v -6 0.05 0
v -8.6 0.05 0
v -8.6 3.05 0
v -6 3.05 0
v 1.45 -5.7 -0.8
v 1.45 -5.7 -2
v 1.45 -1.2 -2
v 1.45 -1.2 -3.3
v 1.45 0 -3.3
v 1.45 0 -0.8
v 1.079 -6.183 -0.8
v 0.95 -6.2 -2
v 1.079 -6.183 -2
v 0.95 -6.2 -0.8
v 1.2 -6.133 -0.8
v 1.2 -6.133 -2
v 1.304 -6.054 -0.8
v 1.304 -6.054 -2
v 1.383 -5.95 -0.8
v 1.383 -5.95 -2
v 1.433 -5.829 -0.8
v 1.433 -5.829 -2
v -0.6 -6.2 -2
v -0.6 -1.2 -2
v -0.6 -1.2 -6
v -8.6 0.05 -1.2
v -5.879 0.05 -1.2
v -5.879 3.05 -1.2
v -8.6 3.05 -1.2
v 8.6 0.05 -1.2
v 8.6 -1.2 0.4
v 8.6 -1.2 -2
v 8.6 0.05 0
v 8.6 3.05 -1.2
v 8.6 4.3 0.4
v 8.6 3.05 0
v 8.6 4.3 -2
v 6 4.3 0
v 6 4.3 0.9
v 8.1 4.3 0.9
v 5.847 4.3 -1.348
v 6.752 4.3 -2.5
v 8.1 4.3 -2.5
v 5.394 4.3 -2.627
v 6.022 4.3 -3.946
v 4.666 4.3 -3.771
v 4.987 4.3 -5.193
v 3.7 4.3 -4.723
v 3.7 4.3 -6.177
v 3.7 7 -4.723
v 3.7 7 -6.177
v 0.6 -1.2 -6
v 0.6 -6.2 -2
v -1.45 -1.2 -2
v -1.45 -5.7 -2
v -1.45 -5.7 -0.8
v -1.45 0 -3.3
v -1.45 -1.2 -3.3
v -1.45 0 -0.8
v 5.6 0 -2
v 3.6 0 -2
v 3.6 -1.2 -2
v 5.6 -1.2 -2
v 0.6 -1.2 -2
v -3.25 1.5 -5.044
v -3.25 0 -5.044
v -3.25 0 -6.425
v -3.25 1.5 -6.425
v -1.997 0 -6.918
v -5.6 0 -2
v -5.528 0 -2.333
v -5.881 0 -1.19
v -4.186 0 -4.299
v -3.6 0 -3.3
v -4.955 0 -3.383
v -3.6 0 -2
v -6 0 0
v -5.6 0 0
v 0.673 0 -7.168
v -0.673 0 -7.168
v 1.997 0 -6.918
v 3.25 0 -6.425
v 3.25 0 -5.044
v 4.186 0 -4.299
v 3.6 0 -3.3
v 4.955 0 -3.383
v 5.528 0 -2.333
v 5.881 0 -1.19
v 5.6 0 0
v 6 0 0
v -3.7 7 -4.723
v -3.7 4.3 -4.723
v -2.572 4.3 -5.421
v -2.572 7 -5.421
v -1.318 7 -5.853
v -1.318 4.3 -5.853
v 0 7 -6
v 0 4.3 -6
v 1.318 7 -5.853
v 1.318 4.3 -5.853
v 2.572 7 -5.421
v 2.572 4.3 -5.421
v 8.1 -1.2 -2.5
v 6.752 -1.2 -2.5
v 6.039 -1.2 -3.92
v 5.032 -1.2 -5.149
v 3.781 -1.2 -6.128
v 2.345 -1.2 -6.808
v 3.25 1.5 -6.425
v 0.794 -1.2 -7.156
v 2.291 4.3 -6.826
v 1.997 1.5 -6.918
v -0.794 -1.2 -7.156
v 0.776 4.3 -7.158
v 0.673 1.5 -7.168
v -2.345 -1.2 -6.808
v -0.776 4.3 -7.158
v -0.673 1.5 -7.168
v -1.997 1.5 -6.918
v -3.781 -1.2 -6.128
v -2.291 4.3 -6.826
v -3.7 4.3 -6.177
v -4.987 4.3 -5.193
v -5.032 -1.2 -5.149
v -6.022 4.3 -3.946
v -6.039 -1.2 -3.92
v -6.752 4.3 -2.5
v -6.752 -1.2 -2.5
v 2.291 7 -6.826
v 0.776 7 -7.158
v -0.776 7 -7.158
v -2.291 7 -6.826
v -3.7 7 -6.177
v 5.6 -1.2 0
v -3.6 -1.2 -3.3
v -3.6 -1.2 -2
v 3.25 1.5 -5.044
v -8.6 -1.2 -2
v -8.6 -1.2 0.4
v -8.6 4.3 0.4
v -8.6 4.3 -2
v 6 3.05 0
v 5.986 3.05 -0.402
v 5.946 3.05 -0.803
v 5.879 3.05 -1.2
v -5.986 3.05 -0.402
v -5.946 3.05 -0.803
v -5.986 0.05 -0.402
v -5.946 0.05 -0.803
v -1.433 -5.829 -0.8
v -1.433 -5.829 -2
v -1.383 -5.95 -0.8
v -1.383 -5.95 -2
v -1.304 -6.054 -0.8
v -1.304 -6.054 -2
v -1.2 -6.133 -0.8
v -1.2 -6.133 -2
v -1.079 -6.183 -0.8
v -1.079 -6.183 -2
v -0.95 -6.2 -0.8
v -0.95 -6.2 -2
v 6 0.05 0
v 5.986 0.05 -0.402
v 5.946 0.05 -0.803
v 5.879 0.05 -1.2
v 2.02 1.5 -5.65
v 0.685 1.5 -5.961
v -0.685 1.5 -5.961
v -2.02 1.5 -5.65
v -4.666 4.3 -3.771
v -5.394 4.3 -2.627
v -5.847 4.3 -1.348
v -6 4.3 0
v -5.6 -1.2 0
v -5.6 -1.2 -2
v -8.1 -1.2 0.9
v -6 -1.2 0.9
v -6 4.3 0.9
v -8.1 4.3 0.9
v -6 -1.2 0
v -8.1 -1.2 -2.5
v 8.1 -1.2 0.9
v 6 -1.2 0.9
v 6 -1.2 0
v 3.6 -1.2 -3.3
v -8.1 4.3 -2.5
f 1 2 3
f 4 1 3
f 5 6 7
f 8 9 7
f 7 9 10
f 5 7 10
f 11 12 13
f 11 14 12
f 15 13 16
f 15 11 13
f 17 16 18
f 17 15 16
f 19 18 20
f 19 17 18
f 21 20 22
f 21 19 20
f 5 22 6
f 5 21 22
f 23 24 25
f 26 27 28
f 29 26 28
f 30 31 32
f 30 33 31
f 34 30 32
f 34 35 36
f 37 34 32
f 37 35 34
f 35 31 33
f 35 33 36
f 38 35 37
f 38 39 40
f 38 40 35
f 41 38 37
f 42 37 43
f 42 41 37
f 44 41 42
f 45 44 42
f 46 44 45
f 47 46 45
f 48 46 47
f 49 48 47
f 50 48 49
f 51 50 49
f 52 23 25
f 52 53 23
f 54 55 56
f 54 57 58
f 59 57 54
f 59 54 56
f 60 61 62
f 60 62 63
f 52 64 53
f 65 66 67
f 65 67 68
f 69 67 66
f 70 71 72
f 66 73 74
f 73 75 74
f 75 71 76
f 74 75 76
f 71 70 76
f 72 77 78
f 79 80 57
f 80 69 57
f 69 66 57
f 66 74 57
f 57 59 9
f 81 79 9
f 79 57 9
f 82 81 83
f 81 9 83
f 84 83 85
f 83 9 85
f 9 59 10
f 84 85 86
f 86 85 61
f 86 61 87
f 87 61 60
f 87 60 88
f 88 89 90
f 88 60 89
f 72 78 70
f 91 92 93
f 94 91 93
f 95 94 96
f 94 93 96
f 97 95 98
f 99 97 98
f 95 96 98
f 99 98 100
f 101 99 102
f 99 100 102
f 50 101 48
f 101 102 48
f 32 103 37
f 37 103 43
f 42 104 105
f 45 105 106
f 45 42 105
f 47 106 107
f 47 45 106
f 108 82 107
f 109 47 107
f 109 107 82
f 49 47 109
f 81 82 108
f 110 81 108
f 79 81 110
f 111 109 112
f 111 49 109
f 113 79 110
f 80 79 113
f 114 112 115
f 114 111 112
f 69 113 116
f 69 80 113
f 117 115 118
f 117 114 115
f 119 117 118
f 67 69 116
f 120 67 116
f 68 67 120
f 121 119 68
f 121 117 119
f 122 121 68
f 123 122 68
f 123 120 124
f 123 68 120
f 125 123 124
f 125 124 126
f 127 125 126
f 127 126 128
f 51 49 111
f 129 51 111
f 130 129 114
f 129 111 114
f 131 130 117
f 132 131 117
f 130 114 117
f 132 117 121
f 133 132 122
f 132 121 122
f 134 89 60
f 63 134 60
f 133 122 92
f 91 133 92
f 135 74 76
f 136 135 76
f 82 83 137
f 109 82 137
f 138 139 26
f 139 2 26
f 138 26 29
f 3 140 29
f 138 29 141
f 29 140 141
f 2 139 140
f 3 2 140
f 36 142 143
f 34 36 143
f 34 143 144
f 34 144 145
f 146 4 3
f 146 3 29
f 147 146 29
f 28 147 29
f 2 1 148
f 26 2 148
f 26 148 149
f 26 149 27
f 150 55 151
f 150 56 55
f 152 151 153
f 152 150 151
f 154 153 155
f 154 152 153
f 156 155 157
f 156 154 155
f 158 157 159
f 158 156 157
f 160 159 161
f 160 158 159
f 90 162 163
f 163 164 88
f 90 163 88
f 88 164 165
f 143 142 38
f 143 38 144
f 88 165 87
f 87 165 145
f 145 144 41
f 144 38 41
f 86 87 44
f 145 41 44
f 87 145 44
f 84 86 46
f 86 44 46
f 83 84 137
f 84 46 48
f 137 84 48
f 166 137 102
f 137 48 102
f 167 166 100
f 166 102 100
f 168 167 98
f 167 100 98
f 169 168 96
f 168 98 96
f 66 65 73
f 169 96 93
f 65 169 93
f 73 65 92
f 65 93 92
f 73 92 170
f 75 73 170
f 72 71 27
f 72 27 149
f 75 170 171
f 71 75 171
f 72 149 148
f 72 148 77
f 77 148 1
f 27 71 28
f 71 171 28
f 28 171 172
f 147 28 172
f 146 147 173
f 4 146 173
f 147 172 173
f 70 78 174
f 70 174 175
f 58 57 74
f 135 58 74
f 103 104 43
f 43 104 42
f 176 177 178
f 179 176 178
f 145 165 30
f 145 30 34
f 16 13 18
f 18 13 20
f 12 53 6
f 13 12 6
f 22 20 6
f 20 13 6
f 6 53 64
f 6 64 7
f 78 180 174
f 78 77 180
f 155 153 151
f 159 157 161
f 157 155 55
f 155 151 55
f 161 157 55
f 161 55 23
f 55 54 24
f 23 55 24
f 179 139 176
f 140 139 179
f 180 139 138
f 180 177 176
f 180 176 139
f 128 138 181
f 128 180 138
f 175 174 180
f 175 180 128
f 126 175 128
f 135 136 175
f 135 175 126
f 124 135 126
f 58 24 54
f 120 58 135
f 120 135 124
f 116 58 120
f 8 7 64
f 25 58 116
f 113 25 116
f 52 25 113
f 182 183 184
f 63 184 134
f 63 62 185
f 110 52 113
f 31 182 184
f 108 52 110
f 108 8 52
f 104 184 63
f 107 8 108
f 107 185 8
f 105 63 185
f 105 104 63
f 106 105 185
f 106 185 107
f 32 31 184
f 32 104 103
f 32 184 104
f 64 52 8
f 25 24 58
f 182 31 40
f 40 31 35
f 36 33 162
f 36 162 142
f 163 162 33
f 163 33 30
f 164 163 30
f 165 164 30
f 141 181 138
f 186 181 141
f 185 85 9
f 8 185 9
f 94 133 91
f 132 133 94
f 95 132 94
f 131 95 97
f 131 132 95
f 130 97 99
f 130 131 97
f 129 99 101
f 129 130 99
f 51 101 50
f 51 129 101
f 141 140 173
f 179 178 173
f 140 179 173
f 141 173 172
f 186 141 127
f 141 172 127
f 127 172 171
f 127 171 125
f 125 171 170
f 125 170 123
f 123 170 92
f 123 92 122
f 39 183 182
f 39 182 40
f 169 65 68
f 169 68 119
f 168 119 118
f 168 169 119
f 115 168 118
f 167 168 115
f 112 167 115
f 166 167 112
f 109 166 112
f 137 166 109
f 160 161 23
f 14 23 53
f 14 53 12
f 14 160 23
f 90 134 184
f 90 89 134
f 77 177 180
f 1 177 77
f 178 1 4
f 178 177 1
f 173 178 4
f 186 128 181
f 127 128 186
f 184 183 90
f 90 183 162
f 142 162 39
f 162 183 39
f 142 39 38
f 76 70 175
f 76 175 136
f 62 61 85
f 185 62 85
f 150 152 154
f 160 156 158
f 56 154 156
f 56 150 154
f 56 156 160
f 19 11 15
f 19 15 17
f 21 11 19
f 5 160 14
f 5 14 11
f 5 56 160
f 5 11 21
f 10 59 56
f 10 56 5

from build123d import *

# Parameters (mm, degrees)
SKETCH1_W                = 6
SKETCH1_H                = 1.2
SKETCH1_W_2              = 1.2
SKETCH1_H_2              = 4.3
REVOLVE1_ANGLE           = 180
REVOLVE2_START           = 4.3
REVOLVE2_DEPTH           = 2.7
SKETCH3_W                = 6.5
SKETCH3_H                = 1.5
CUT_EXTRUDE1_DEPTH       = 10
CUT_EXTRUDE2_DEPTH       = 10
SKETCH7_W                = 2.9
SKETCH7_H                = 1.2
BOSS_EXTRUDE3_DEPTH      = 5
BOSS_EXTRUDE4_DEPTH      = 0.6
FILLET1_R                = 0.5
SKETCH9_W                = 3.4
SKETCH9_H                = 5.5
SKETCH9_W_2              = 1.2
SKETCH9_H_2              = 3
BOSS_EXTRUDE5_DEPTH      = 2.6
SKETCH11_W               = 1.2
SKETCH11_H               = 3
CUT_EXTRUDE3_DEPTH       = 3.6
CHAMFER2_SIZE            = 0.5
CHAMFER3_SIZE            = 0.5
CHAMFER2_OF_MIRROR2_SIZE = 0.5
CHAMFER3_OF_MIRROR2_SIZE = 0.5
SKETCH5_W                = 2
SKETCH5_H                = 2
CUT_EXTRUDE4_DEPTH       = 3.6


# Read off the part's stored shape, not the designer's step: Revolve2
with BuildPart() as part:
    # Sketch1 → Revolve1 (revolve)
    with BuildSketch(Plane.XY):
        with Locations((3, -0.6)):
            Rectangle(SKETCH1_W, SKETCH1_H)
        with Locations((6.6, -0.6)):
            Rectangle(SKETCH1_W_2, SKETCH1_H)
        with Locations((6.6, 2.15)):
            Rectangle(SKETCH1_W_2, SKETCH1_H_2)
    revolve(axis=Axis((0, -1.2, 0), (0, 1, 0)), revolution_arc=REVOLVE1_ANGLE)

    # Revolve2 outline → Revolve2 (add)
    with BuildSketch(Plane(origin=(0, 0, 0), x_dir=(1, 0, 0), z_dir=(0, 1, 0)).offset(REVOLVE2_START)):
        with BuildLine():
            ThreePointArc((3.7, 6.176568627), (0, 7.2), (-3.7, 6.176568627))
            Line((-3.7, 6.176568627), (-3.7, 4.723346271))
            ThreePointArc((-3.7, 4.723346271), (0, 6), (3.7, 4.723346271))
            Line((3.7, 4.723346271), (3.7, 6.176568627))
        make_face()
    extrude(amount=REVOLVE2_DEPTH)

    # Sketch3 → Cut-Extrude1 (cut)
    with BuildSketch(Plane.XY):
        with Locations((0, 0.75)):
            Rectangle(SKETCH3_W, SKETCH3_H)
    extrude(amount=-CUT_EXTRUDE1_DEPTH, mode=Mode.SUBTRACT)

    # Sketch4 → Cut-Extrude2 (cut)
    with BuildSketch(Plane(origin=(0, 0, 0), x_dir=(1, 0, 0), z_dir=(0, 1, 0))):
        Polygon((-1.45, 3.3), (-3.6, 3.3), (-3.6, 0), (3.6, 0), (3.6, 3.3), (1.45, 3.3), (1.45, 0.8), (-1.45, 0.8), align=None)
    extrude(amount=-CUT_EXTRUDE2_DEPTH, mode=Mode.SUBTRACT)

    # Sketch7 → Boss-Extrude3 (add)
    with BuildSketch(Plane.XZ.offset(1.2)):
        with Locations((0, -1.4)):
            Rectangle(SKETCH7_W, SKETCH7_H)
    extrude(amount=BOSS_EXTRUDE3_DEPTH)

    # Sketch8 → Boss-Extrude4 (add, symmetric)
    with BuildSketch(Plane(origin=(0, 0, 0), x_dir=(0, 0, -1), z_dir=(1, 0, 0))):
        Polygon((2, -6.2), (6, -1.2), (2, -1.2), align=None)
    extrude(amount=BOSS_EXTRUDE4_DEPTH, both=True)

    # Fillet1
    fillet1_edges = [part.edges().sort_by_distance(p)[0] for p in [
        (-1.45, -6.2, -1.4),
        (1.45, -6.2, -1.4),
    ]]
    fillet(fillet1_edges, radius=FILLET1_R)

    # Sketch9 → Boss-Extrude5 (add)
    with BuildSketch(Plane(origin=(6, 0, 0), x_dir=(0, 0, -1), z_dir=(1, 0, 0))):
        with Locations((0.8, 1.55)):
            Rectangle(SKETCH9_W, SKETCH9_H)
        with Locations((0.6, 1.55)):
            Rectangle(SKETCH9_W_2, SKETCH9_H_2, mode=Mode.SUBTRACT)
    boss_extrude5 = extrude(amount=BOSS_EXTRUDE5_DEPTH)

    # Sketch11 → Cut-Extrude3 (cut)
    with BuildSketch(Plane(origin=(8.6, 0, 0), x_dir=(0, 0, -1), z_dir=(1, 0, 0))):
        with Locations((0.6, 1.55)):
            Rectangle(SKETCH11_W, SKETCH11_H)
    cut_extrude3 = extrude(amount=-CUT_EXTRUDE3_DEPTH, mode=Mode.SUBTRACT)

    # Chamfer2
    chamfer2_edges = [part.edges().sort_by_distance(p)[0] for p in [
        (8.6, 1.55, 0.9),
    ]]
    chamfer(chamfer2_edges, length=CHAMFER2_SIZE)

    # Chamfer3
    chamfer3_edges = [part.edges().sort_by_distance(p)[0] for p in [
        (8.6, 1.55, -2.5),
    ]]
    chamfer(chamfer3_edges, length=CHAMFER3_SIZE)

    # Mirror2: Boss-Extrude5, Cut-Extrude3 across plane
    add(boss_extrude5.mirror(Plane(origin=(0, 0, 0), x_dir=(0, 0, 1), z_dir=(1, 0, 0))))
    add(cut_extrude3.mirror(Plane(origin=(0, 0, 0), x_dir=(0, 0, 1), z_dir=(1, 0, 0))), mode=Mode.SUBTRACT)

    # Chamfer2 of Mirror2
    chamfer2_of_mirror2_edges = [part.edges().sort_by_distance(p)[0] for p in [
        (-8.6, 1.55, 0.9),
    ]]
    chamfer(chamfer2_of_mirror2_edges, length=CHAMFER2_OF_MIRROR2_SIZE)

    # Chamfer3 of Mirror2
    chamfer3_of_mirror2_edges = [part.edges().sort_by_distance(p)[0] for p in [
        (-8.6, 1.55, -2.5),
    ]]
    chamfer(chamfer3_of_mirror2_edges, length=CHAMFER3_OF_MIRROR2_SIZE)

    # Sketch5 → Cut-Extrude4 (cut)
    with BuildSketch(Plane(origin=(0, 0, 0), x_dir=(1, 0, 0), z_dir=(0, 1, 0))):
        with Locations((4.6, 1)):
            Rectangle(SKETCH5_W, SKETCH5_H)
        with Locations((-4.6, 1)):
            Rectangle(SKETCH5_W, SKETCH5_H)
    extrude(amount=-CUT_EXTRUDE4_DEPTH, mode=Mode.SUBTRACT)


solid = part.part
